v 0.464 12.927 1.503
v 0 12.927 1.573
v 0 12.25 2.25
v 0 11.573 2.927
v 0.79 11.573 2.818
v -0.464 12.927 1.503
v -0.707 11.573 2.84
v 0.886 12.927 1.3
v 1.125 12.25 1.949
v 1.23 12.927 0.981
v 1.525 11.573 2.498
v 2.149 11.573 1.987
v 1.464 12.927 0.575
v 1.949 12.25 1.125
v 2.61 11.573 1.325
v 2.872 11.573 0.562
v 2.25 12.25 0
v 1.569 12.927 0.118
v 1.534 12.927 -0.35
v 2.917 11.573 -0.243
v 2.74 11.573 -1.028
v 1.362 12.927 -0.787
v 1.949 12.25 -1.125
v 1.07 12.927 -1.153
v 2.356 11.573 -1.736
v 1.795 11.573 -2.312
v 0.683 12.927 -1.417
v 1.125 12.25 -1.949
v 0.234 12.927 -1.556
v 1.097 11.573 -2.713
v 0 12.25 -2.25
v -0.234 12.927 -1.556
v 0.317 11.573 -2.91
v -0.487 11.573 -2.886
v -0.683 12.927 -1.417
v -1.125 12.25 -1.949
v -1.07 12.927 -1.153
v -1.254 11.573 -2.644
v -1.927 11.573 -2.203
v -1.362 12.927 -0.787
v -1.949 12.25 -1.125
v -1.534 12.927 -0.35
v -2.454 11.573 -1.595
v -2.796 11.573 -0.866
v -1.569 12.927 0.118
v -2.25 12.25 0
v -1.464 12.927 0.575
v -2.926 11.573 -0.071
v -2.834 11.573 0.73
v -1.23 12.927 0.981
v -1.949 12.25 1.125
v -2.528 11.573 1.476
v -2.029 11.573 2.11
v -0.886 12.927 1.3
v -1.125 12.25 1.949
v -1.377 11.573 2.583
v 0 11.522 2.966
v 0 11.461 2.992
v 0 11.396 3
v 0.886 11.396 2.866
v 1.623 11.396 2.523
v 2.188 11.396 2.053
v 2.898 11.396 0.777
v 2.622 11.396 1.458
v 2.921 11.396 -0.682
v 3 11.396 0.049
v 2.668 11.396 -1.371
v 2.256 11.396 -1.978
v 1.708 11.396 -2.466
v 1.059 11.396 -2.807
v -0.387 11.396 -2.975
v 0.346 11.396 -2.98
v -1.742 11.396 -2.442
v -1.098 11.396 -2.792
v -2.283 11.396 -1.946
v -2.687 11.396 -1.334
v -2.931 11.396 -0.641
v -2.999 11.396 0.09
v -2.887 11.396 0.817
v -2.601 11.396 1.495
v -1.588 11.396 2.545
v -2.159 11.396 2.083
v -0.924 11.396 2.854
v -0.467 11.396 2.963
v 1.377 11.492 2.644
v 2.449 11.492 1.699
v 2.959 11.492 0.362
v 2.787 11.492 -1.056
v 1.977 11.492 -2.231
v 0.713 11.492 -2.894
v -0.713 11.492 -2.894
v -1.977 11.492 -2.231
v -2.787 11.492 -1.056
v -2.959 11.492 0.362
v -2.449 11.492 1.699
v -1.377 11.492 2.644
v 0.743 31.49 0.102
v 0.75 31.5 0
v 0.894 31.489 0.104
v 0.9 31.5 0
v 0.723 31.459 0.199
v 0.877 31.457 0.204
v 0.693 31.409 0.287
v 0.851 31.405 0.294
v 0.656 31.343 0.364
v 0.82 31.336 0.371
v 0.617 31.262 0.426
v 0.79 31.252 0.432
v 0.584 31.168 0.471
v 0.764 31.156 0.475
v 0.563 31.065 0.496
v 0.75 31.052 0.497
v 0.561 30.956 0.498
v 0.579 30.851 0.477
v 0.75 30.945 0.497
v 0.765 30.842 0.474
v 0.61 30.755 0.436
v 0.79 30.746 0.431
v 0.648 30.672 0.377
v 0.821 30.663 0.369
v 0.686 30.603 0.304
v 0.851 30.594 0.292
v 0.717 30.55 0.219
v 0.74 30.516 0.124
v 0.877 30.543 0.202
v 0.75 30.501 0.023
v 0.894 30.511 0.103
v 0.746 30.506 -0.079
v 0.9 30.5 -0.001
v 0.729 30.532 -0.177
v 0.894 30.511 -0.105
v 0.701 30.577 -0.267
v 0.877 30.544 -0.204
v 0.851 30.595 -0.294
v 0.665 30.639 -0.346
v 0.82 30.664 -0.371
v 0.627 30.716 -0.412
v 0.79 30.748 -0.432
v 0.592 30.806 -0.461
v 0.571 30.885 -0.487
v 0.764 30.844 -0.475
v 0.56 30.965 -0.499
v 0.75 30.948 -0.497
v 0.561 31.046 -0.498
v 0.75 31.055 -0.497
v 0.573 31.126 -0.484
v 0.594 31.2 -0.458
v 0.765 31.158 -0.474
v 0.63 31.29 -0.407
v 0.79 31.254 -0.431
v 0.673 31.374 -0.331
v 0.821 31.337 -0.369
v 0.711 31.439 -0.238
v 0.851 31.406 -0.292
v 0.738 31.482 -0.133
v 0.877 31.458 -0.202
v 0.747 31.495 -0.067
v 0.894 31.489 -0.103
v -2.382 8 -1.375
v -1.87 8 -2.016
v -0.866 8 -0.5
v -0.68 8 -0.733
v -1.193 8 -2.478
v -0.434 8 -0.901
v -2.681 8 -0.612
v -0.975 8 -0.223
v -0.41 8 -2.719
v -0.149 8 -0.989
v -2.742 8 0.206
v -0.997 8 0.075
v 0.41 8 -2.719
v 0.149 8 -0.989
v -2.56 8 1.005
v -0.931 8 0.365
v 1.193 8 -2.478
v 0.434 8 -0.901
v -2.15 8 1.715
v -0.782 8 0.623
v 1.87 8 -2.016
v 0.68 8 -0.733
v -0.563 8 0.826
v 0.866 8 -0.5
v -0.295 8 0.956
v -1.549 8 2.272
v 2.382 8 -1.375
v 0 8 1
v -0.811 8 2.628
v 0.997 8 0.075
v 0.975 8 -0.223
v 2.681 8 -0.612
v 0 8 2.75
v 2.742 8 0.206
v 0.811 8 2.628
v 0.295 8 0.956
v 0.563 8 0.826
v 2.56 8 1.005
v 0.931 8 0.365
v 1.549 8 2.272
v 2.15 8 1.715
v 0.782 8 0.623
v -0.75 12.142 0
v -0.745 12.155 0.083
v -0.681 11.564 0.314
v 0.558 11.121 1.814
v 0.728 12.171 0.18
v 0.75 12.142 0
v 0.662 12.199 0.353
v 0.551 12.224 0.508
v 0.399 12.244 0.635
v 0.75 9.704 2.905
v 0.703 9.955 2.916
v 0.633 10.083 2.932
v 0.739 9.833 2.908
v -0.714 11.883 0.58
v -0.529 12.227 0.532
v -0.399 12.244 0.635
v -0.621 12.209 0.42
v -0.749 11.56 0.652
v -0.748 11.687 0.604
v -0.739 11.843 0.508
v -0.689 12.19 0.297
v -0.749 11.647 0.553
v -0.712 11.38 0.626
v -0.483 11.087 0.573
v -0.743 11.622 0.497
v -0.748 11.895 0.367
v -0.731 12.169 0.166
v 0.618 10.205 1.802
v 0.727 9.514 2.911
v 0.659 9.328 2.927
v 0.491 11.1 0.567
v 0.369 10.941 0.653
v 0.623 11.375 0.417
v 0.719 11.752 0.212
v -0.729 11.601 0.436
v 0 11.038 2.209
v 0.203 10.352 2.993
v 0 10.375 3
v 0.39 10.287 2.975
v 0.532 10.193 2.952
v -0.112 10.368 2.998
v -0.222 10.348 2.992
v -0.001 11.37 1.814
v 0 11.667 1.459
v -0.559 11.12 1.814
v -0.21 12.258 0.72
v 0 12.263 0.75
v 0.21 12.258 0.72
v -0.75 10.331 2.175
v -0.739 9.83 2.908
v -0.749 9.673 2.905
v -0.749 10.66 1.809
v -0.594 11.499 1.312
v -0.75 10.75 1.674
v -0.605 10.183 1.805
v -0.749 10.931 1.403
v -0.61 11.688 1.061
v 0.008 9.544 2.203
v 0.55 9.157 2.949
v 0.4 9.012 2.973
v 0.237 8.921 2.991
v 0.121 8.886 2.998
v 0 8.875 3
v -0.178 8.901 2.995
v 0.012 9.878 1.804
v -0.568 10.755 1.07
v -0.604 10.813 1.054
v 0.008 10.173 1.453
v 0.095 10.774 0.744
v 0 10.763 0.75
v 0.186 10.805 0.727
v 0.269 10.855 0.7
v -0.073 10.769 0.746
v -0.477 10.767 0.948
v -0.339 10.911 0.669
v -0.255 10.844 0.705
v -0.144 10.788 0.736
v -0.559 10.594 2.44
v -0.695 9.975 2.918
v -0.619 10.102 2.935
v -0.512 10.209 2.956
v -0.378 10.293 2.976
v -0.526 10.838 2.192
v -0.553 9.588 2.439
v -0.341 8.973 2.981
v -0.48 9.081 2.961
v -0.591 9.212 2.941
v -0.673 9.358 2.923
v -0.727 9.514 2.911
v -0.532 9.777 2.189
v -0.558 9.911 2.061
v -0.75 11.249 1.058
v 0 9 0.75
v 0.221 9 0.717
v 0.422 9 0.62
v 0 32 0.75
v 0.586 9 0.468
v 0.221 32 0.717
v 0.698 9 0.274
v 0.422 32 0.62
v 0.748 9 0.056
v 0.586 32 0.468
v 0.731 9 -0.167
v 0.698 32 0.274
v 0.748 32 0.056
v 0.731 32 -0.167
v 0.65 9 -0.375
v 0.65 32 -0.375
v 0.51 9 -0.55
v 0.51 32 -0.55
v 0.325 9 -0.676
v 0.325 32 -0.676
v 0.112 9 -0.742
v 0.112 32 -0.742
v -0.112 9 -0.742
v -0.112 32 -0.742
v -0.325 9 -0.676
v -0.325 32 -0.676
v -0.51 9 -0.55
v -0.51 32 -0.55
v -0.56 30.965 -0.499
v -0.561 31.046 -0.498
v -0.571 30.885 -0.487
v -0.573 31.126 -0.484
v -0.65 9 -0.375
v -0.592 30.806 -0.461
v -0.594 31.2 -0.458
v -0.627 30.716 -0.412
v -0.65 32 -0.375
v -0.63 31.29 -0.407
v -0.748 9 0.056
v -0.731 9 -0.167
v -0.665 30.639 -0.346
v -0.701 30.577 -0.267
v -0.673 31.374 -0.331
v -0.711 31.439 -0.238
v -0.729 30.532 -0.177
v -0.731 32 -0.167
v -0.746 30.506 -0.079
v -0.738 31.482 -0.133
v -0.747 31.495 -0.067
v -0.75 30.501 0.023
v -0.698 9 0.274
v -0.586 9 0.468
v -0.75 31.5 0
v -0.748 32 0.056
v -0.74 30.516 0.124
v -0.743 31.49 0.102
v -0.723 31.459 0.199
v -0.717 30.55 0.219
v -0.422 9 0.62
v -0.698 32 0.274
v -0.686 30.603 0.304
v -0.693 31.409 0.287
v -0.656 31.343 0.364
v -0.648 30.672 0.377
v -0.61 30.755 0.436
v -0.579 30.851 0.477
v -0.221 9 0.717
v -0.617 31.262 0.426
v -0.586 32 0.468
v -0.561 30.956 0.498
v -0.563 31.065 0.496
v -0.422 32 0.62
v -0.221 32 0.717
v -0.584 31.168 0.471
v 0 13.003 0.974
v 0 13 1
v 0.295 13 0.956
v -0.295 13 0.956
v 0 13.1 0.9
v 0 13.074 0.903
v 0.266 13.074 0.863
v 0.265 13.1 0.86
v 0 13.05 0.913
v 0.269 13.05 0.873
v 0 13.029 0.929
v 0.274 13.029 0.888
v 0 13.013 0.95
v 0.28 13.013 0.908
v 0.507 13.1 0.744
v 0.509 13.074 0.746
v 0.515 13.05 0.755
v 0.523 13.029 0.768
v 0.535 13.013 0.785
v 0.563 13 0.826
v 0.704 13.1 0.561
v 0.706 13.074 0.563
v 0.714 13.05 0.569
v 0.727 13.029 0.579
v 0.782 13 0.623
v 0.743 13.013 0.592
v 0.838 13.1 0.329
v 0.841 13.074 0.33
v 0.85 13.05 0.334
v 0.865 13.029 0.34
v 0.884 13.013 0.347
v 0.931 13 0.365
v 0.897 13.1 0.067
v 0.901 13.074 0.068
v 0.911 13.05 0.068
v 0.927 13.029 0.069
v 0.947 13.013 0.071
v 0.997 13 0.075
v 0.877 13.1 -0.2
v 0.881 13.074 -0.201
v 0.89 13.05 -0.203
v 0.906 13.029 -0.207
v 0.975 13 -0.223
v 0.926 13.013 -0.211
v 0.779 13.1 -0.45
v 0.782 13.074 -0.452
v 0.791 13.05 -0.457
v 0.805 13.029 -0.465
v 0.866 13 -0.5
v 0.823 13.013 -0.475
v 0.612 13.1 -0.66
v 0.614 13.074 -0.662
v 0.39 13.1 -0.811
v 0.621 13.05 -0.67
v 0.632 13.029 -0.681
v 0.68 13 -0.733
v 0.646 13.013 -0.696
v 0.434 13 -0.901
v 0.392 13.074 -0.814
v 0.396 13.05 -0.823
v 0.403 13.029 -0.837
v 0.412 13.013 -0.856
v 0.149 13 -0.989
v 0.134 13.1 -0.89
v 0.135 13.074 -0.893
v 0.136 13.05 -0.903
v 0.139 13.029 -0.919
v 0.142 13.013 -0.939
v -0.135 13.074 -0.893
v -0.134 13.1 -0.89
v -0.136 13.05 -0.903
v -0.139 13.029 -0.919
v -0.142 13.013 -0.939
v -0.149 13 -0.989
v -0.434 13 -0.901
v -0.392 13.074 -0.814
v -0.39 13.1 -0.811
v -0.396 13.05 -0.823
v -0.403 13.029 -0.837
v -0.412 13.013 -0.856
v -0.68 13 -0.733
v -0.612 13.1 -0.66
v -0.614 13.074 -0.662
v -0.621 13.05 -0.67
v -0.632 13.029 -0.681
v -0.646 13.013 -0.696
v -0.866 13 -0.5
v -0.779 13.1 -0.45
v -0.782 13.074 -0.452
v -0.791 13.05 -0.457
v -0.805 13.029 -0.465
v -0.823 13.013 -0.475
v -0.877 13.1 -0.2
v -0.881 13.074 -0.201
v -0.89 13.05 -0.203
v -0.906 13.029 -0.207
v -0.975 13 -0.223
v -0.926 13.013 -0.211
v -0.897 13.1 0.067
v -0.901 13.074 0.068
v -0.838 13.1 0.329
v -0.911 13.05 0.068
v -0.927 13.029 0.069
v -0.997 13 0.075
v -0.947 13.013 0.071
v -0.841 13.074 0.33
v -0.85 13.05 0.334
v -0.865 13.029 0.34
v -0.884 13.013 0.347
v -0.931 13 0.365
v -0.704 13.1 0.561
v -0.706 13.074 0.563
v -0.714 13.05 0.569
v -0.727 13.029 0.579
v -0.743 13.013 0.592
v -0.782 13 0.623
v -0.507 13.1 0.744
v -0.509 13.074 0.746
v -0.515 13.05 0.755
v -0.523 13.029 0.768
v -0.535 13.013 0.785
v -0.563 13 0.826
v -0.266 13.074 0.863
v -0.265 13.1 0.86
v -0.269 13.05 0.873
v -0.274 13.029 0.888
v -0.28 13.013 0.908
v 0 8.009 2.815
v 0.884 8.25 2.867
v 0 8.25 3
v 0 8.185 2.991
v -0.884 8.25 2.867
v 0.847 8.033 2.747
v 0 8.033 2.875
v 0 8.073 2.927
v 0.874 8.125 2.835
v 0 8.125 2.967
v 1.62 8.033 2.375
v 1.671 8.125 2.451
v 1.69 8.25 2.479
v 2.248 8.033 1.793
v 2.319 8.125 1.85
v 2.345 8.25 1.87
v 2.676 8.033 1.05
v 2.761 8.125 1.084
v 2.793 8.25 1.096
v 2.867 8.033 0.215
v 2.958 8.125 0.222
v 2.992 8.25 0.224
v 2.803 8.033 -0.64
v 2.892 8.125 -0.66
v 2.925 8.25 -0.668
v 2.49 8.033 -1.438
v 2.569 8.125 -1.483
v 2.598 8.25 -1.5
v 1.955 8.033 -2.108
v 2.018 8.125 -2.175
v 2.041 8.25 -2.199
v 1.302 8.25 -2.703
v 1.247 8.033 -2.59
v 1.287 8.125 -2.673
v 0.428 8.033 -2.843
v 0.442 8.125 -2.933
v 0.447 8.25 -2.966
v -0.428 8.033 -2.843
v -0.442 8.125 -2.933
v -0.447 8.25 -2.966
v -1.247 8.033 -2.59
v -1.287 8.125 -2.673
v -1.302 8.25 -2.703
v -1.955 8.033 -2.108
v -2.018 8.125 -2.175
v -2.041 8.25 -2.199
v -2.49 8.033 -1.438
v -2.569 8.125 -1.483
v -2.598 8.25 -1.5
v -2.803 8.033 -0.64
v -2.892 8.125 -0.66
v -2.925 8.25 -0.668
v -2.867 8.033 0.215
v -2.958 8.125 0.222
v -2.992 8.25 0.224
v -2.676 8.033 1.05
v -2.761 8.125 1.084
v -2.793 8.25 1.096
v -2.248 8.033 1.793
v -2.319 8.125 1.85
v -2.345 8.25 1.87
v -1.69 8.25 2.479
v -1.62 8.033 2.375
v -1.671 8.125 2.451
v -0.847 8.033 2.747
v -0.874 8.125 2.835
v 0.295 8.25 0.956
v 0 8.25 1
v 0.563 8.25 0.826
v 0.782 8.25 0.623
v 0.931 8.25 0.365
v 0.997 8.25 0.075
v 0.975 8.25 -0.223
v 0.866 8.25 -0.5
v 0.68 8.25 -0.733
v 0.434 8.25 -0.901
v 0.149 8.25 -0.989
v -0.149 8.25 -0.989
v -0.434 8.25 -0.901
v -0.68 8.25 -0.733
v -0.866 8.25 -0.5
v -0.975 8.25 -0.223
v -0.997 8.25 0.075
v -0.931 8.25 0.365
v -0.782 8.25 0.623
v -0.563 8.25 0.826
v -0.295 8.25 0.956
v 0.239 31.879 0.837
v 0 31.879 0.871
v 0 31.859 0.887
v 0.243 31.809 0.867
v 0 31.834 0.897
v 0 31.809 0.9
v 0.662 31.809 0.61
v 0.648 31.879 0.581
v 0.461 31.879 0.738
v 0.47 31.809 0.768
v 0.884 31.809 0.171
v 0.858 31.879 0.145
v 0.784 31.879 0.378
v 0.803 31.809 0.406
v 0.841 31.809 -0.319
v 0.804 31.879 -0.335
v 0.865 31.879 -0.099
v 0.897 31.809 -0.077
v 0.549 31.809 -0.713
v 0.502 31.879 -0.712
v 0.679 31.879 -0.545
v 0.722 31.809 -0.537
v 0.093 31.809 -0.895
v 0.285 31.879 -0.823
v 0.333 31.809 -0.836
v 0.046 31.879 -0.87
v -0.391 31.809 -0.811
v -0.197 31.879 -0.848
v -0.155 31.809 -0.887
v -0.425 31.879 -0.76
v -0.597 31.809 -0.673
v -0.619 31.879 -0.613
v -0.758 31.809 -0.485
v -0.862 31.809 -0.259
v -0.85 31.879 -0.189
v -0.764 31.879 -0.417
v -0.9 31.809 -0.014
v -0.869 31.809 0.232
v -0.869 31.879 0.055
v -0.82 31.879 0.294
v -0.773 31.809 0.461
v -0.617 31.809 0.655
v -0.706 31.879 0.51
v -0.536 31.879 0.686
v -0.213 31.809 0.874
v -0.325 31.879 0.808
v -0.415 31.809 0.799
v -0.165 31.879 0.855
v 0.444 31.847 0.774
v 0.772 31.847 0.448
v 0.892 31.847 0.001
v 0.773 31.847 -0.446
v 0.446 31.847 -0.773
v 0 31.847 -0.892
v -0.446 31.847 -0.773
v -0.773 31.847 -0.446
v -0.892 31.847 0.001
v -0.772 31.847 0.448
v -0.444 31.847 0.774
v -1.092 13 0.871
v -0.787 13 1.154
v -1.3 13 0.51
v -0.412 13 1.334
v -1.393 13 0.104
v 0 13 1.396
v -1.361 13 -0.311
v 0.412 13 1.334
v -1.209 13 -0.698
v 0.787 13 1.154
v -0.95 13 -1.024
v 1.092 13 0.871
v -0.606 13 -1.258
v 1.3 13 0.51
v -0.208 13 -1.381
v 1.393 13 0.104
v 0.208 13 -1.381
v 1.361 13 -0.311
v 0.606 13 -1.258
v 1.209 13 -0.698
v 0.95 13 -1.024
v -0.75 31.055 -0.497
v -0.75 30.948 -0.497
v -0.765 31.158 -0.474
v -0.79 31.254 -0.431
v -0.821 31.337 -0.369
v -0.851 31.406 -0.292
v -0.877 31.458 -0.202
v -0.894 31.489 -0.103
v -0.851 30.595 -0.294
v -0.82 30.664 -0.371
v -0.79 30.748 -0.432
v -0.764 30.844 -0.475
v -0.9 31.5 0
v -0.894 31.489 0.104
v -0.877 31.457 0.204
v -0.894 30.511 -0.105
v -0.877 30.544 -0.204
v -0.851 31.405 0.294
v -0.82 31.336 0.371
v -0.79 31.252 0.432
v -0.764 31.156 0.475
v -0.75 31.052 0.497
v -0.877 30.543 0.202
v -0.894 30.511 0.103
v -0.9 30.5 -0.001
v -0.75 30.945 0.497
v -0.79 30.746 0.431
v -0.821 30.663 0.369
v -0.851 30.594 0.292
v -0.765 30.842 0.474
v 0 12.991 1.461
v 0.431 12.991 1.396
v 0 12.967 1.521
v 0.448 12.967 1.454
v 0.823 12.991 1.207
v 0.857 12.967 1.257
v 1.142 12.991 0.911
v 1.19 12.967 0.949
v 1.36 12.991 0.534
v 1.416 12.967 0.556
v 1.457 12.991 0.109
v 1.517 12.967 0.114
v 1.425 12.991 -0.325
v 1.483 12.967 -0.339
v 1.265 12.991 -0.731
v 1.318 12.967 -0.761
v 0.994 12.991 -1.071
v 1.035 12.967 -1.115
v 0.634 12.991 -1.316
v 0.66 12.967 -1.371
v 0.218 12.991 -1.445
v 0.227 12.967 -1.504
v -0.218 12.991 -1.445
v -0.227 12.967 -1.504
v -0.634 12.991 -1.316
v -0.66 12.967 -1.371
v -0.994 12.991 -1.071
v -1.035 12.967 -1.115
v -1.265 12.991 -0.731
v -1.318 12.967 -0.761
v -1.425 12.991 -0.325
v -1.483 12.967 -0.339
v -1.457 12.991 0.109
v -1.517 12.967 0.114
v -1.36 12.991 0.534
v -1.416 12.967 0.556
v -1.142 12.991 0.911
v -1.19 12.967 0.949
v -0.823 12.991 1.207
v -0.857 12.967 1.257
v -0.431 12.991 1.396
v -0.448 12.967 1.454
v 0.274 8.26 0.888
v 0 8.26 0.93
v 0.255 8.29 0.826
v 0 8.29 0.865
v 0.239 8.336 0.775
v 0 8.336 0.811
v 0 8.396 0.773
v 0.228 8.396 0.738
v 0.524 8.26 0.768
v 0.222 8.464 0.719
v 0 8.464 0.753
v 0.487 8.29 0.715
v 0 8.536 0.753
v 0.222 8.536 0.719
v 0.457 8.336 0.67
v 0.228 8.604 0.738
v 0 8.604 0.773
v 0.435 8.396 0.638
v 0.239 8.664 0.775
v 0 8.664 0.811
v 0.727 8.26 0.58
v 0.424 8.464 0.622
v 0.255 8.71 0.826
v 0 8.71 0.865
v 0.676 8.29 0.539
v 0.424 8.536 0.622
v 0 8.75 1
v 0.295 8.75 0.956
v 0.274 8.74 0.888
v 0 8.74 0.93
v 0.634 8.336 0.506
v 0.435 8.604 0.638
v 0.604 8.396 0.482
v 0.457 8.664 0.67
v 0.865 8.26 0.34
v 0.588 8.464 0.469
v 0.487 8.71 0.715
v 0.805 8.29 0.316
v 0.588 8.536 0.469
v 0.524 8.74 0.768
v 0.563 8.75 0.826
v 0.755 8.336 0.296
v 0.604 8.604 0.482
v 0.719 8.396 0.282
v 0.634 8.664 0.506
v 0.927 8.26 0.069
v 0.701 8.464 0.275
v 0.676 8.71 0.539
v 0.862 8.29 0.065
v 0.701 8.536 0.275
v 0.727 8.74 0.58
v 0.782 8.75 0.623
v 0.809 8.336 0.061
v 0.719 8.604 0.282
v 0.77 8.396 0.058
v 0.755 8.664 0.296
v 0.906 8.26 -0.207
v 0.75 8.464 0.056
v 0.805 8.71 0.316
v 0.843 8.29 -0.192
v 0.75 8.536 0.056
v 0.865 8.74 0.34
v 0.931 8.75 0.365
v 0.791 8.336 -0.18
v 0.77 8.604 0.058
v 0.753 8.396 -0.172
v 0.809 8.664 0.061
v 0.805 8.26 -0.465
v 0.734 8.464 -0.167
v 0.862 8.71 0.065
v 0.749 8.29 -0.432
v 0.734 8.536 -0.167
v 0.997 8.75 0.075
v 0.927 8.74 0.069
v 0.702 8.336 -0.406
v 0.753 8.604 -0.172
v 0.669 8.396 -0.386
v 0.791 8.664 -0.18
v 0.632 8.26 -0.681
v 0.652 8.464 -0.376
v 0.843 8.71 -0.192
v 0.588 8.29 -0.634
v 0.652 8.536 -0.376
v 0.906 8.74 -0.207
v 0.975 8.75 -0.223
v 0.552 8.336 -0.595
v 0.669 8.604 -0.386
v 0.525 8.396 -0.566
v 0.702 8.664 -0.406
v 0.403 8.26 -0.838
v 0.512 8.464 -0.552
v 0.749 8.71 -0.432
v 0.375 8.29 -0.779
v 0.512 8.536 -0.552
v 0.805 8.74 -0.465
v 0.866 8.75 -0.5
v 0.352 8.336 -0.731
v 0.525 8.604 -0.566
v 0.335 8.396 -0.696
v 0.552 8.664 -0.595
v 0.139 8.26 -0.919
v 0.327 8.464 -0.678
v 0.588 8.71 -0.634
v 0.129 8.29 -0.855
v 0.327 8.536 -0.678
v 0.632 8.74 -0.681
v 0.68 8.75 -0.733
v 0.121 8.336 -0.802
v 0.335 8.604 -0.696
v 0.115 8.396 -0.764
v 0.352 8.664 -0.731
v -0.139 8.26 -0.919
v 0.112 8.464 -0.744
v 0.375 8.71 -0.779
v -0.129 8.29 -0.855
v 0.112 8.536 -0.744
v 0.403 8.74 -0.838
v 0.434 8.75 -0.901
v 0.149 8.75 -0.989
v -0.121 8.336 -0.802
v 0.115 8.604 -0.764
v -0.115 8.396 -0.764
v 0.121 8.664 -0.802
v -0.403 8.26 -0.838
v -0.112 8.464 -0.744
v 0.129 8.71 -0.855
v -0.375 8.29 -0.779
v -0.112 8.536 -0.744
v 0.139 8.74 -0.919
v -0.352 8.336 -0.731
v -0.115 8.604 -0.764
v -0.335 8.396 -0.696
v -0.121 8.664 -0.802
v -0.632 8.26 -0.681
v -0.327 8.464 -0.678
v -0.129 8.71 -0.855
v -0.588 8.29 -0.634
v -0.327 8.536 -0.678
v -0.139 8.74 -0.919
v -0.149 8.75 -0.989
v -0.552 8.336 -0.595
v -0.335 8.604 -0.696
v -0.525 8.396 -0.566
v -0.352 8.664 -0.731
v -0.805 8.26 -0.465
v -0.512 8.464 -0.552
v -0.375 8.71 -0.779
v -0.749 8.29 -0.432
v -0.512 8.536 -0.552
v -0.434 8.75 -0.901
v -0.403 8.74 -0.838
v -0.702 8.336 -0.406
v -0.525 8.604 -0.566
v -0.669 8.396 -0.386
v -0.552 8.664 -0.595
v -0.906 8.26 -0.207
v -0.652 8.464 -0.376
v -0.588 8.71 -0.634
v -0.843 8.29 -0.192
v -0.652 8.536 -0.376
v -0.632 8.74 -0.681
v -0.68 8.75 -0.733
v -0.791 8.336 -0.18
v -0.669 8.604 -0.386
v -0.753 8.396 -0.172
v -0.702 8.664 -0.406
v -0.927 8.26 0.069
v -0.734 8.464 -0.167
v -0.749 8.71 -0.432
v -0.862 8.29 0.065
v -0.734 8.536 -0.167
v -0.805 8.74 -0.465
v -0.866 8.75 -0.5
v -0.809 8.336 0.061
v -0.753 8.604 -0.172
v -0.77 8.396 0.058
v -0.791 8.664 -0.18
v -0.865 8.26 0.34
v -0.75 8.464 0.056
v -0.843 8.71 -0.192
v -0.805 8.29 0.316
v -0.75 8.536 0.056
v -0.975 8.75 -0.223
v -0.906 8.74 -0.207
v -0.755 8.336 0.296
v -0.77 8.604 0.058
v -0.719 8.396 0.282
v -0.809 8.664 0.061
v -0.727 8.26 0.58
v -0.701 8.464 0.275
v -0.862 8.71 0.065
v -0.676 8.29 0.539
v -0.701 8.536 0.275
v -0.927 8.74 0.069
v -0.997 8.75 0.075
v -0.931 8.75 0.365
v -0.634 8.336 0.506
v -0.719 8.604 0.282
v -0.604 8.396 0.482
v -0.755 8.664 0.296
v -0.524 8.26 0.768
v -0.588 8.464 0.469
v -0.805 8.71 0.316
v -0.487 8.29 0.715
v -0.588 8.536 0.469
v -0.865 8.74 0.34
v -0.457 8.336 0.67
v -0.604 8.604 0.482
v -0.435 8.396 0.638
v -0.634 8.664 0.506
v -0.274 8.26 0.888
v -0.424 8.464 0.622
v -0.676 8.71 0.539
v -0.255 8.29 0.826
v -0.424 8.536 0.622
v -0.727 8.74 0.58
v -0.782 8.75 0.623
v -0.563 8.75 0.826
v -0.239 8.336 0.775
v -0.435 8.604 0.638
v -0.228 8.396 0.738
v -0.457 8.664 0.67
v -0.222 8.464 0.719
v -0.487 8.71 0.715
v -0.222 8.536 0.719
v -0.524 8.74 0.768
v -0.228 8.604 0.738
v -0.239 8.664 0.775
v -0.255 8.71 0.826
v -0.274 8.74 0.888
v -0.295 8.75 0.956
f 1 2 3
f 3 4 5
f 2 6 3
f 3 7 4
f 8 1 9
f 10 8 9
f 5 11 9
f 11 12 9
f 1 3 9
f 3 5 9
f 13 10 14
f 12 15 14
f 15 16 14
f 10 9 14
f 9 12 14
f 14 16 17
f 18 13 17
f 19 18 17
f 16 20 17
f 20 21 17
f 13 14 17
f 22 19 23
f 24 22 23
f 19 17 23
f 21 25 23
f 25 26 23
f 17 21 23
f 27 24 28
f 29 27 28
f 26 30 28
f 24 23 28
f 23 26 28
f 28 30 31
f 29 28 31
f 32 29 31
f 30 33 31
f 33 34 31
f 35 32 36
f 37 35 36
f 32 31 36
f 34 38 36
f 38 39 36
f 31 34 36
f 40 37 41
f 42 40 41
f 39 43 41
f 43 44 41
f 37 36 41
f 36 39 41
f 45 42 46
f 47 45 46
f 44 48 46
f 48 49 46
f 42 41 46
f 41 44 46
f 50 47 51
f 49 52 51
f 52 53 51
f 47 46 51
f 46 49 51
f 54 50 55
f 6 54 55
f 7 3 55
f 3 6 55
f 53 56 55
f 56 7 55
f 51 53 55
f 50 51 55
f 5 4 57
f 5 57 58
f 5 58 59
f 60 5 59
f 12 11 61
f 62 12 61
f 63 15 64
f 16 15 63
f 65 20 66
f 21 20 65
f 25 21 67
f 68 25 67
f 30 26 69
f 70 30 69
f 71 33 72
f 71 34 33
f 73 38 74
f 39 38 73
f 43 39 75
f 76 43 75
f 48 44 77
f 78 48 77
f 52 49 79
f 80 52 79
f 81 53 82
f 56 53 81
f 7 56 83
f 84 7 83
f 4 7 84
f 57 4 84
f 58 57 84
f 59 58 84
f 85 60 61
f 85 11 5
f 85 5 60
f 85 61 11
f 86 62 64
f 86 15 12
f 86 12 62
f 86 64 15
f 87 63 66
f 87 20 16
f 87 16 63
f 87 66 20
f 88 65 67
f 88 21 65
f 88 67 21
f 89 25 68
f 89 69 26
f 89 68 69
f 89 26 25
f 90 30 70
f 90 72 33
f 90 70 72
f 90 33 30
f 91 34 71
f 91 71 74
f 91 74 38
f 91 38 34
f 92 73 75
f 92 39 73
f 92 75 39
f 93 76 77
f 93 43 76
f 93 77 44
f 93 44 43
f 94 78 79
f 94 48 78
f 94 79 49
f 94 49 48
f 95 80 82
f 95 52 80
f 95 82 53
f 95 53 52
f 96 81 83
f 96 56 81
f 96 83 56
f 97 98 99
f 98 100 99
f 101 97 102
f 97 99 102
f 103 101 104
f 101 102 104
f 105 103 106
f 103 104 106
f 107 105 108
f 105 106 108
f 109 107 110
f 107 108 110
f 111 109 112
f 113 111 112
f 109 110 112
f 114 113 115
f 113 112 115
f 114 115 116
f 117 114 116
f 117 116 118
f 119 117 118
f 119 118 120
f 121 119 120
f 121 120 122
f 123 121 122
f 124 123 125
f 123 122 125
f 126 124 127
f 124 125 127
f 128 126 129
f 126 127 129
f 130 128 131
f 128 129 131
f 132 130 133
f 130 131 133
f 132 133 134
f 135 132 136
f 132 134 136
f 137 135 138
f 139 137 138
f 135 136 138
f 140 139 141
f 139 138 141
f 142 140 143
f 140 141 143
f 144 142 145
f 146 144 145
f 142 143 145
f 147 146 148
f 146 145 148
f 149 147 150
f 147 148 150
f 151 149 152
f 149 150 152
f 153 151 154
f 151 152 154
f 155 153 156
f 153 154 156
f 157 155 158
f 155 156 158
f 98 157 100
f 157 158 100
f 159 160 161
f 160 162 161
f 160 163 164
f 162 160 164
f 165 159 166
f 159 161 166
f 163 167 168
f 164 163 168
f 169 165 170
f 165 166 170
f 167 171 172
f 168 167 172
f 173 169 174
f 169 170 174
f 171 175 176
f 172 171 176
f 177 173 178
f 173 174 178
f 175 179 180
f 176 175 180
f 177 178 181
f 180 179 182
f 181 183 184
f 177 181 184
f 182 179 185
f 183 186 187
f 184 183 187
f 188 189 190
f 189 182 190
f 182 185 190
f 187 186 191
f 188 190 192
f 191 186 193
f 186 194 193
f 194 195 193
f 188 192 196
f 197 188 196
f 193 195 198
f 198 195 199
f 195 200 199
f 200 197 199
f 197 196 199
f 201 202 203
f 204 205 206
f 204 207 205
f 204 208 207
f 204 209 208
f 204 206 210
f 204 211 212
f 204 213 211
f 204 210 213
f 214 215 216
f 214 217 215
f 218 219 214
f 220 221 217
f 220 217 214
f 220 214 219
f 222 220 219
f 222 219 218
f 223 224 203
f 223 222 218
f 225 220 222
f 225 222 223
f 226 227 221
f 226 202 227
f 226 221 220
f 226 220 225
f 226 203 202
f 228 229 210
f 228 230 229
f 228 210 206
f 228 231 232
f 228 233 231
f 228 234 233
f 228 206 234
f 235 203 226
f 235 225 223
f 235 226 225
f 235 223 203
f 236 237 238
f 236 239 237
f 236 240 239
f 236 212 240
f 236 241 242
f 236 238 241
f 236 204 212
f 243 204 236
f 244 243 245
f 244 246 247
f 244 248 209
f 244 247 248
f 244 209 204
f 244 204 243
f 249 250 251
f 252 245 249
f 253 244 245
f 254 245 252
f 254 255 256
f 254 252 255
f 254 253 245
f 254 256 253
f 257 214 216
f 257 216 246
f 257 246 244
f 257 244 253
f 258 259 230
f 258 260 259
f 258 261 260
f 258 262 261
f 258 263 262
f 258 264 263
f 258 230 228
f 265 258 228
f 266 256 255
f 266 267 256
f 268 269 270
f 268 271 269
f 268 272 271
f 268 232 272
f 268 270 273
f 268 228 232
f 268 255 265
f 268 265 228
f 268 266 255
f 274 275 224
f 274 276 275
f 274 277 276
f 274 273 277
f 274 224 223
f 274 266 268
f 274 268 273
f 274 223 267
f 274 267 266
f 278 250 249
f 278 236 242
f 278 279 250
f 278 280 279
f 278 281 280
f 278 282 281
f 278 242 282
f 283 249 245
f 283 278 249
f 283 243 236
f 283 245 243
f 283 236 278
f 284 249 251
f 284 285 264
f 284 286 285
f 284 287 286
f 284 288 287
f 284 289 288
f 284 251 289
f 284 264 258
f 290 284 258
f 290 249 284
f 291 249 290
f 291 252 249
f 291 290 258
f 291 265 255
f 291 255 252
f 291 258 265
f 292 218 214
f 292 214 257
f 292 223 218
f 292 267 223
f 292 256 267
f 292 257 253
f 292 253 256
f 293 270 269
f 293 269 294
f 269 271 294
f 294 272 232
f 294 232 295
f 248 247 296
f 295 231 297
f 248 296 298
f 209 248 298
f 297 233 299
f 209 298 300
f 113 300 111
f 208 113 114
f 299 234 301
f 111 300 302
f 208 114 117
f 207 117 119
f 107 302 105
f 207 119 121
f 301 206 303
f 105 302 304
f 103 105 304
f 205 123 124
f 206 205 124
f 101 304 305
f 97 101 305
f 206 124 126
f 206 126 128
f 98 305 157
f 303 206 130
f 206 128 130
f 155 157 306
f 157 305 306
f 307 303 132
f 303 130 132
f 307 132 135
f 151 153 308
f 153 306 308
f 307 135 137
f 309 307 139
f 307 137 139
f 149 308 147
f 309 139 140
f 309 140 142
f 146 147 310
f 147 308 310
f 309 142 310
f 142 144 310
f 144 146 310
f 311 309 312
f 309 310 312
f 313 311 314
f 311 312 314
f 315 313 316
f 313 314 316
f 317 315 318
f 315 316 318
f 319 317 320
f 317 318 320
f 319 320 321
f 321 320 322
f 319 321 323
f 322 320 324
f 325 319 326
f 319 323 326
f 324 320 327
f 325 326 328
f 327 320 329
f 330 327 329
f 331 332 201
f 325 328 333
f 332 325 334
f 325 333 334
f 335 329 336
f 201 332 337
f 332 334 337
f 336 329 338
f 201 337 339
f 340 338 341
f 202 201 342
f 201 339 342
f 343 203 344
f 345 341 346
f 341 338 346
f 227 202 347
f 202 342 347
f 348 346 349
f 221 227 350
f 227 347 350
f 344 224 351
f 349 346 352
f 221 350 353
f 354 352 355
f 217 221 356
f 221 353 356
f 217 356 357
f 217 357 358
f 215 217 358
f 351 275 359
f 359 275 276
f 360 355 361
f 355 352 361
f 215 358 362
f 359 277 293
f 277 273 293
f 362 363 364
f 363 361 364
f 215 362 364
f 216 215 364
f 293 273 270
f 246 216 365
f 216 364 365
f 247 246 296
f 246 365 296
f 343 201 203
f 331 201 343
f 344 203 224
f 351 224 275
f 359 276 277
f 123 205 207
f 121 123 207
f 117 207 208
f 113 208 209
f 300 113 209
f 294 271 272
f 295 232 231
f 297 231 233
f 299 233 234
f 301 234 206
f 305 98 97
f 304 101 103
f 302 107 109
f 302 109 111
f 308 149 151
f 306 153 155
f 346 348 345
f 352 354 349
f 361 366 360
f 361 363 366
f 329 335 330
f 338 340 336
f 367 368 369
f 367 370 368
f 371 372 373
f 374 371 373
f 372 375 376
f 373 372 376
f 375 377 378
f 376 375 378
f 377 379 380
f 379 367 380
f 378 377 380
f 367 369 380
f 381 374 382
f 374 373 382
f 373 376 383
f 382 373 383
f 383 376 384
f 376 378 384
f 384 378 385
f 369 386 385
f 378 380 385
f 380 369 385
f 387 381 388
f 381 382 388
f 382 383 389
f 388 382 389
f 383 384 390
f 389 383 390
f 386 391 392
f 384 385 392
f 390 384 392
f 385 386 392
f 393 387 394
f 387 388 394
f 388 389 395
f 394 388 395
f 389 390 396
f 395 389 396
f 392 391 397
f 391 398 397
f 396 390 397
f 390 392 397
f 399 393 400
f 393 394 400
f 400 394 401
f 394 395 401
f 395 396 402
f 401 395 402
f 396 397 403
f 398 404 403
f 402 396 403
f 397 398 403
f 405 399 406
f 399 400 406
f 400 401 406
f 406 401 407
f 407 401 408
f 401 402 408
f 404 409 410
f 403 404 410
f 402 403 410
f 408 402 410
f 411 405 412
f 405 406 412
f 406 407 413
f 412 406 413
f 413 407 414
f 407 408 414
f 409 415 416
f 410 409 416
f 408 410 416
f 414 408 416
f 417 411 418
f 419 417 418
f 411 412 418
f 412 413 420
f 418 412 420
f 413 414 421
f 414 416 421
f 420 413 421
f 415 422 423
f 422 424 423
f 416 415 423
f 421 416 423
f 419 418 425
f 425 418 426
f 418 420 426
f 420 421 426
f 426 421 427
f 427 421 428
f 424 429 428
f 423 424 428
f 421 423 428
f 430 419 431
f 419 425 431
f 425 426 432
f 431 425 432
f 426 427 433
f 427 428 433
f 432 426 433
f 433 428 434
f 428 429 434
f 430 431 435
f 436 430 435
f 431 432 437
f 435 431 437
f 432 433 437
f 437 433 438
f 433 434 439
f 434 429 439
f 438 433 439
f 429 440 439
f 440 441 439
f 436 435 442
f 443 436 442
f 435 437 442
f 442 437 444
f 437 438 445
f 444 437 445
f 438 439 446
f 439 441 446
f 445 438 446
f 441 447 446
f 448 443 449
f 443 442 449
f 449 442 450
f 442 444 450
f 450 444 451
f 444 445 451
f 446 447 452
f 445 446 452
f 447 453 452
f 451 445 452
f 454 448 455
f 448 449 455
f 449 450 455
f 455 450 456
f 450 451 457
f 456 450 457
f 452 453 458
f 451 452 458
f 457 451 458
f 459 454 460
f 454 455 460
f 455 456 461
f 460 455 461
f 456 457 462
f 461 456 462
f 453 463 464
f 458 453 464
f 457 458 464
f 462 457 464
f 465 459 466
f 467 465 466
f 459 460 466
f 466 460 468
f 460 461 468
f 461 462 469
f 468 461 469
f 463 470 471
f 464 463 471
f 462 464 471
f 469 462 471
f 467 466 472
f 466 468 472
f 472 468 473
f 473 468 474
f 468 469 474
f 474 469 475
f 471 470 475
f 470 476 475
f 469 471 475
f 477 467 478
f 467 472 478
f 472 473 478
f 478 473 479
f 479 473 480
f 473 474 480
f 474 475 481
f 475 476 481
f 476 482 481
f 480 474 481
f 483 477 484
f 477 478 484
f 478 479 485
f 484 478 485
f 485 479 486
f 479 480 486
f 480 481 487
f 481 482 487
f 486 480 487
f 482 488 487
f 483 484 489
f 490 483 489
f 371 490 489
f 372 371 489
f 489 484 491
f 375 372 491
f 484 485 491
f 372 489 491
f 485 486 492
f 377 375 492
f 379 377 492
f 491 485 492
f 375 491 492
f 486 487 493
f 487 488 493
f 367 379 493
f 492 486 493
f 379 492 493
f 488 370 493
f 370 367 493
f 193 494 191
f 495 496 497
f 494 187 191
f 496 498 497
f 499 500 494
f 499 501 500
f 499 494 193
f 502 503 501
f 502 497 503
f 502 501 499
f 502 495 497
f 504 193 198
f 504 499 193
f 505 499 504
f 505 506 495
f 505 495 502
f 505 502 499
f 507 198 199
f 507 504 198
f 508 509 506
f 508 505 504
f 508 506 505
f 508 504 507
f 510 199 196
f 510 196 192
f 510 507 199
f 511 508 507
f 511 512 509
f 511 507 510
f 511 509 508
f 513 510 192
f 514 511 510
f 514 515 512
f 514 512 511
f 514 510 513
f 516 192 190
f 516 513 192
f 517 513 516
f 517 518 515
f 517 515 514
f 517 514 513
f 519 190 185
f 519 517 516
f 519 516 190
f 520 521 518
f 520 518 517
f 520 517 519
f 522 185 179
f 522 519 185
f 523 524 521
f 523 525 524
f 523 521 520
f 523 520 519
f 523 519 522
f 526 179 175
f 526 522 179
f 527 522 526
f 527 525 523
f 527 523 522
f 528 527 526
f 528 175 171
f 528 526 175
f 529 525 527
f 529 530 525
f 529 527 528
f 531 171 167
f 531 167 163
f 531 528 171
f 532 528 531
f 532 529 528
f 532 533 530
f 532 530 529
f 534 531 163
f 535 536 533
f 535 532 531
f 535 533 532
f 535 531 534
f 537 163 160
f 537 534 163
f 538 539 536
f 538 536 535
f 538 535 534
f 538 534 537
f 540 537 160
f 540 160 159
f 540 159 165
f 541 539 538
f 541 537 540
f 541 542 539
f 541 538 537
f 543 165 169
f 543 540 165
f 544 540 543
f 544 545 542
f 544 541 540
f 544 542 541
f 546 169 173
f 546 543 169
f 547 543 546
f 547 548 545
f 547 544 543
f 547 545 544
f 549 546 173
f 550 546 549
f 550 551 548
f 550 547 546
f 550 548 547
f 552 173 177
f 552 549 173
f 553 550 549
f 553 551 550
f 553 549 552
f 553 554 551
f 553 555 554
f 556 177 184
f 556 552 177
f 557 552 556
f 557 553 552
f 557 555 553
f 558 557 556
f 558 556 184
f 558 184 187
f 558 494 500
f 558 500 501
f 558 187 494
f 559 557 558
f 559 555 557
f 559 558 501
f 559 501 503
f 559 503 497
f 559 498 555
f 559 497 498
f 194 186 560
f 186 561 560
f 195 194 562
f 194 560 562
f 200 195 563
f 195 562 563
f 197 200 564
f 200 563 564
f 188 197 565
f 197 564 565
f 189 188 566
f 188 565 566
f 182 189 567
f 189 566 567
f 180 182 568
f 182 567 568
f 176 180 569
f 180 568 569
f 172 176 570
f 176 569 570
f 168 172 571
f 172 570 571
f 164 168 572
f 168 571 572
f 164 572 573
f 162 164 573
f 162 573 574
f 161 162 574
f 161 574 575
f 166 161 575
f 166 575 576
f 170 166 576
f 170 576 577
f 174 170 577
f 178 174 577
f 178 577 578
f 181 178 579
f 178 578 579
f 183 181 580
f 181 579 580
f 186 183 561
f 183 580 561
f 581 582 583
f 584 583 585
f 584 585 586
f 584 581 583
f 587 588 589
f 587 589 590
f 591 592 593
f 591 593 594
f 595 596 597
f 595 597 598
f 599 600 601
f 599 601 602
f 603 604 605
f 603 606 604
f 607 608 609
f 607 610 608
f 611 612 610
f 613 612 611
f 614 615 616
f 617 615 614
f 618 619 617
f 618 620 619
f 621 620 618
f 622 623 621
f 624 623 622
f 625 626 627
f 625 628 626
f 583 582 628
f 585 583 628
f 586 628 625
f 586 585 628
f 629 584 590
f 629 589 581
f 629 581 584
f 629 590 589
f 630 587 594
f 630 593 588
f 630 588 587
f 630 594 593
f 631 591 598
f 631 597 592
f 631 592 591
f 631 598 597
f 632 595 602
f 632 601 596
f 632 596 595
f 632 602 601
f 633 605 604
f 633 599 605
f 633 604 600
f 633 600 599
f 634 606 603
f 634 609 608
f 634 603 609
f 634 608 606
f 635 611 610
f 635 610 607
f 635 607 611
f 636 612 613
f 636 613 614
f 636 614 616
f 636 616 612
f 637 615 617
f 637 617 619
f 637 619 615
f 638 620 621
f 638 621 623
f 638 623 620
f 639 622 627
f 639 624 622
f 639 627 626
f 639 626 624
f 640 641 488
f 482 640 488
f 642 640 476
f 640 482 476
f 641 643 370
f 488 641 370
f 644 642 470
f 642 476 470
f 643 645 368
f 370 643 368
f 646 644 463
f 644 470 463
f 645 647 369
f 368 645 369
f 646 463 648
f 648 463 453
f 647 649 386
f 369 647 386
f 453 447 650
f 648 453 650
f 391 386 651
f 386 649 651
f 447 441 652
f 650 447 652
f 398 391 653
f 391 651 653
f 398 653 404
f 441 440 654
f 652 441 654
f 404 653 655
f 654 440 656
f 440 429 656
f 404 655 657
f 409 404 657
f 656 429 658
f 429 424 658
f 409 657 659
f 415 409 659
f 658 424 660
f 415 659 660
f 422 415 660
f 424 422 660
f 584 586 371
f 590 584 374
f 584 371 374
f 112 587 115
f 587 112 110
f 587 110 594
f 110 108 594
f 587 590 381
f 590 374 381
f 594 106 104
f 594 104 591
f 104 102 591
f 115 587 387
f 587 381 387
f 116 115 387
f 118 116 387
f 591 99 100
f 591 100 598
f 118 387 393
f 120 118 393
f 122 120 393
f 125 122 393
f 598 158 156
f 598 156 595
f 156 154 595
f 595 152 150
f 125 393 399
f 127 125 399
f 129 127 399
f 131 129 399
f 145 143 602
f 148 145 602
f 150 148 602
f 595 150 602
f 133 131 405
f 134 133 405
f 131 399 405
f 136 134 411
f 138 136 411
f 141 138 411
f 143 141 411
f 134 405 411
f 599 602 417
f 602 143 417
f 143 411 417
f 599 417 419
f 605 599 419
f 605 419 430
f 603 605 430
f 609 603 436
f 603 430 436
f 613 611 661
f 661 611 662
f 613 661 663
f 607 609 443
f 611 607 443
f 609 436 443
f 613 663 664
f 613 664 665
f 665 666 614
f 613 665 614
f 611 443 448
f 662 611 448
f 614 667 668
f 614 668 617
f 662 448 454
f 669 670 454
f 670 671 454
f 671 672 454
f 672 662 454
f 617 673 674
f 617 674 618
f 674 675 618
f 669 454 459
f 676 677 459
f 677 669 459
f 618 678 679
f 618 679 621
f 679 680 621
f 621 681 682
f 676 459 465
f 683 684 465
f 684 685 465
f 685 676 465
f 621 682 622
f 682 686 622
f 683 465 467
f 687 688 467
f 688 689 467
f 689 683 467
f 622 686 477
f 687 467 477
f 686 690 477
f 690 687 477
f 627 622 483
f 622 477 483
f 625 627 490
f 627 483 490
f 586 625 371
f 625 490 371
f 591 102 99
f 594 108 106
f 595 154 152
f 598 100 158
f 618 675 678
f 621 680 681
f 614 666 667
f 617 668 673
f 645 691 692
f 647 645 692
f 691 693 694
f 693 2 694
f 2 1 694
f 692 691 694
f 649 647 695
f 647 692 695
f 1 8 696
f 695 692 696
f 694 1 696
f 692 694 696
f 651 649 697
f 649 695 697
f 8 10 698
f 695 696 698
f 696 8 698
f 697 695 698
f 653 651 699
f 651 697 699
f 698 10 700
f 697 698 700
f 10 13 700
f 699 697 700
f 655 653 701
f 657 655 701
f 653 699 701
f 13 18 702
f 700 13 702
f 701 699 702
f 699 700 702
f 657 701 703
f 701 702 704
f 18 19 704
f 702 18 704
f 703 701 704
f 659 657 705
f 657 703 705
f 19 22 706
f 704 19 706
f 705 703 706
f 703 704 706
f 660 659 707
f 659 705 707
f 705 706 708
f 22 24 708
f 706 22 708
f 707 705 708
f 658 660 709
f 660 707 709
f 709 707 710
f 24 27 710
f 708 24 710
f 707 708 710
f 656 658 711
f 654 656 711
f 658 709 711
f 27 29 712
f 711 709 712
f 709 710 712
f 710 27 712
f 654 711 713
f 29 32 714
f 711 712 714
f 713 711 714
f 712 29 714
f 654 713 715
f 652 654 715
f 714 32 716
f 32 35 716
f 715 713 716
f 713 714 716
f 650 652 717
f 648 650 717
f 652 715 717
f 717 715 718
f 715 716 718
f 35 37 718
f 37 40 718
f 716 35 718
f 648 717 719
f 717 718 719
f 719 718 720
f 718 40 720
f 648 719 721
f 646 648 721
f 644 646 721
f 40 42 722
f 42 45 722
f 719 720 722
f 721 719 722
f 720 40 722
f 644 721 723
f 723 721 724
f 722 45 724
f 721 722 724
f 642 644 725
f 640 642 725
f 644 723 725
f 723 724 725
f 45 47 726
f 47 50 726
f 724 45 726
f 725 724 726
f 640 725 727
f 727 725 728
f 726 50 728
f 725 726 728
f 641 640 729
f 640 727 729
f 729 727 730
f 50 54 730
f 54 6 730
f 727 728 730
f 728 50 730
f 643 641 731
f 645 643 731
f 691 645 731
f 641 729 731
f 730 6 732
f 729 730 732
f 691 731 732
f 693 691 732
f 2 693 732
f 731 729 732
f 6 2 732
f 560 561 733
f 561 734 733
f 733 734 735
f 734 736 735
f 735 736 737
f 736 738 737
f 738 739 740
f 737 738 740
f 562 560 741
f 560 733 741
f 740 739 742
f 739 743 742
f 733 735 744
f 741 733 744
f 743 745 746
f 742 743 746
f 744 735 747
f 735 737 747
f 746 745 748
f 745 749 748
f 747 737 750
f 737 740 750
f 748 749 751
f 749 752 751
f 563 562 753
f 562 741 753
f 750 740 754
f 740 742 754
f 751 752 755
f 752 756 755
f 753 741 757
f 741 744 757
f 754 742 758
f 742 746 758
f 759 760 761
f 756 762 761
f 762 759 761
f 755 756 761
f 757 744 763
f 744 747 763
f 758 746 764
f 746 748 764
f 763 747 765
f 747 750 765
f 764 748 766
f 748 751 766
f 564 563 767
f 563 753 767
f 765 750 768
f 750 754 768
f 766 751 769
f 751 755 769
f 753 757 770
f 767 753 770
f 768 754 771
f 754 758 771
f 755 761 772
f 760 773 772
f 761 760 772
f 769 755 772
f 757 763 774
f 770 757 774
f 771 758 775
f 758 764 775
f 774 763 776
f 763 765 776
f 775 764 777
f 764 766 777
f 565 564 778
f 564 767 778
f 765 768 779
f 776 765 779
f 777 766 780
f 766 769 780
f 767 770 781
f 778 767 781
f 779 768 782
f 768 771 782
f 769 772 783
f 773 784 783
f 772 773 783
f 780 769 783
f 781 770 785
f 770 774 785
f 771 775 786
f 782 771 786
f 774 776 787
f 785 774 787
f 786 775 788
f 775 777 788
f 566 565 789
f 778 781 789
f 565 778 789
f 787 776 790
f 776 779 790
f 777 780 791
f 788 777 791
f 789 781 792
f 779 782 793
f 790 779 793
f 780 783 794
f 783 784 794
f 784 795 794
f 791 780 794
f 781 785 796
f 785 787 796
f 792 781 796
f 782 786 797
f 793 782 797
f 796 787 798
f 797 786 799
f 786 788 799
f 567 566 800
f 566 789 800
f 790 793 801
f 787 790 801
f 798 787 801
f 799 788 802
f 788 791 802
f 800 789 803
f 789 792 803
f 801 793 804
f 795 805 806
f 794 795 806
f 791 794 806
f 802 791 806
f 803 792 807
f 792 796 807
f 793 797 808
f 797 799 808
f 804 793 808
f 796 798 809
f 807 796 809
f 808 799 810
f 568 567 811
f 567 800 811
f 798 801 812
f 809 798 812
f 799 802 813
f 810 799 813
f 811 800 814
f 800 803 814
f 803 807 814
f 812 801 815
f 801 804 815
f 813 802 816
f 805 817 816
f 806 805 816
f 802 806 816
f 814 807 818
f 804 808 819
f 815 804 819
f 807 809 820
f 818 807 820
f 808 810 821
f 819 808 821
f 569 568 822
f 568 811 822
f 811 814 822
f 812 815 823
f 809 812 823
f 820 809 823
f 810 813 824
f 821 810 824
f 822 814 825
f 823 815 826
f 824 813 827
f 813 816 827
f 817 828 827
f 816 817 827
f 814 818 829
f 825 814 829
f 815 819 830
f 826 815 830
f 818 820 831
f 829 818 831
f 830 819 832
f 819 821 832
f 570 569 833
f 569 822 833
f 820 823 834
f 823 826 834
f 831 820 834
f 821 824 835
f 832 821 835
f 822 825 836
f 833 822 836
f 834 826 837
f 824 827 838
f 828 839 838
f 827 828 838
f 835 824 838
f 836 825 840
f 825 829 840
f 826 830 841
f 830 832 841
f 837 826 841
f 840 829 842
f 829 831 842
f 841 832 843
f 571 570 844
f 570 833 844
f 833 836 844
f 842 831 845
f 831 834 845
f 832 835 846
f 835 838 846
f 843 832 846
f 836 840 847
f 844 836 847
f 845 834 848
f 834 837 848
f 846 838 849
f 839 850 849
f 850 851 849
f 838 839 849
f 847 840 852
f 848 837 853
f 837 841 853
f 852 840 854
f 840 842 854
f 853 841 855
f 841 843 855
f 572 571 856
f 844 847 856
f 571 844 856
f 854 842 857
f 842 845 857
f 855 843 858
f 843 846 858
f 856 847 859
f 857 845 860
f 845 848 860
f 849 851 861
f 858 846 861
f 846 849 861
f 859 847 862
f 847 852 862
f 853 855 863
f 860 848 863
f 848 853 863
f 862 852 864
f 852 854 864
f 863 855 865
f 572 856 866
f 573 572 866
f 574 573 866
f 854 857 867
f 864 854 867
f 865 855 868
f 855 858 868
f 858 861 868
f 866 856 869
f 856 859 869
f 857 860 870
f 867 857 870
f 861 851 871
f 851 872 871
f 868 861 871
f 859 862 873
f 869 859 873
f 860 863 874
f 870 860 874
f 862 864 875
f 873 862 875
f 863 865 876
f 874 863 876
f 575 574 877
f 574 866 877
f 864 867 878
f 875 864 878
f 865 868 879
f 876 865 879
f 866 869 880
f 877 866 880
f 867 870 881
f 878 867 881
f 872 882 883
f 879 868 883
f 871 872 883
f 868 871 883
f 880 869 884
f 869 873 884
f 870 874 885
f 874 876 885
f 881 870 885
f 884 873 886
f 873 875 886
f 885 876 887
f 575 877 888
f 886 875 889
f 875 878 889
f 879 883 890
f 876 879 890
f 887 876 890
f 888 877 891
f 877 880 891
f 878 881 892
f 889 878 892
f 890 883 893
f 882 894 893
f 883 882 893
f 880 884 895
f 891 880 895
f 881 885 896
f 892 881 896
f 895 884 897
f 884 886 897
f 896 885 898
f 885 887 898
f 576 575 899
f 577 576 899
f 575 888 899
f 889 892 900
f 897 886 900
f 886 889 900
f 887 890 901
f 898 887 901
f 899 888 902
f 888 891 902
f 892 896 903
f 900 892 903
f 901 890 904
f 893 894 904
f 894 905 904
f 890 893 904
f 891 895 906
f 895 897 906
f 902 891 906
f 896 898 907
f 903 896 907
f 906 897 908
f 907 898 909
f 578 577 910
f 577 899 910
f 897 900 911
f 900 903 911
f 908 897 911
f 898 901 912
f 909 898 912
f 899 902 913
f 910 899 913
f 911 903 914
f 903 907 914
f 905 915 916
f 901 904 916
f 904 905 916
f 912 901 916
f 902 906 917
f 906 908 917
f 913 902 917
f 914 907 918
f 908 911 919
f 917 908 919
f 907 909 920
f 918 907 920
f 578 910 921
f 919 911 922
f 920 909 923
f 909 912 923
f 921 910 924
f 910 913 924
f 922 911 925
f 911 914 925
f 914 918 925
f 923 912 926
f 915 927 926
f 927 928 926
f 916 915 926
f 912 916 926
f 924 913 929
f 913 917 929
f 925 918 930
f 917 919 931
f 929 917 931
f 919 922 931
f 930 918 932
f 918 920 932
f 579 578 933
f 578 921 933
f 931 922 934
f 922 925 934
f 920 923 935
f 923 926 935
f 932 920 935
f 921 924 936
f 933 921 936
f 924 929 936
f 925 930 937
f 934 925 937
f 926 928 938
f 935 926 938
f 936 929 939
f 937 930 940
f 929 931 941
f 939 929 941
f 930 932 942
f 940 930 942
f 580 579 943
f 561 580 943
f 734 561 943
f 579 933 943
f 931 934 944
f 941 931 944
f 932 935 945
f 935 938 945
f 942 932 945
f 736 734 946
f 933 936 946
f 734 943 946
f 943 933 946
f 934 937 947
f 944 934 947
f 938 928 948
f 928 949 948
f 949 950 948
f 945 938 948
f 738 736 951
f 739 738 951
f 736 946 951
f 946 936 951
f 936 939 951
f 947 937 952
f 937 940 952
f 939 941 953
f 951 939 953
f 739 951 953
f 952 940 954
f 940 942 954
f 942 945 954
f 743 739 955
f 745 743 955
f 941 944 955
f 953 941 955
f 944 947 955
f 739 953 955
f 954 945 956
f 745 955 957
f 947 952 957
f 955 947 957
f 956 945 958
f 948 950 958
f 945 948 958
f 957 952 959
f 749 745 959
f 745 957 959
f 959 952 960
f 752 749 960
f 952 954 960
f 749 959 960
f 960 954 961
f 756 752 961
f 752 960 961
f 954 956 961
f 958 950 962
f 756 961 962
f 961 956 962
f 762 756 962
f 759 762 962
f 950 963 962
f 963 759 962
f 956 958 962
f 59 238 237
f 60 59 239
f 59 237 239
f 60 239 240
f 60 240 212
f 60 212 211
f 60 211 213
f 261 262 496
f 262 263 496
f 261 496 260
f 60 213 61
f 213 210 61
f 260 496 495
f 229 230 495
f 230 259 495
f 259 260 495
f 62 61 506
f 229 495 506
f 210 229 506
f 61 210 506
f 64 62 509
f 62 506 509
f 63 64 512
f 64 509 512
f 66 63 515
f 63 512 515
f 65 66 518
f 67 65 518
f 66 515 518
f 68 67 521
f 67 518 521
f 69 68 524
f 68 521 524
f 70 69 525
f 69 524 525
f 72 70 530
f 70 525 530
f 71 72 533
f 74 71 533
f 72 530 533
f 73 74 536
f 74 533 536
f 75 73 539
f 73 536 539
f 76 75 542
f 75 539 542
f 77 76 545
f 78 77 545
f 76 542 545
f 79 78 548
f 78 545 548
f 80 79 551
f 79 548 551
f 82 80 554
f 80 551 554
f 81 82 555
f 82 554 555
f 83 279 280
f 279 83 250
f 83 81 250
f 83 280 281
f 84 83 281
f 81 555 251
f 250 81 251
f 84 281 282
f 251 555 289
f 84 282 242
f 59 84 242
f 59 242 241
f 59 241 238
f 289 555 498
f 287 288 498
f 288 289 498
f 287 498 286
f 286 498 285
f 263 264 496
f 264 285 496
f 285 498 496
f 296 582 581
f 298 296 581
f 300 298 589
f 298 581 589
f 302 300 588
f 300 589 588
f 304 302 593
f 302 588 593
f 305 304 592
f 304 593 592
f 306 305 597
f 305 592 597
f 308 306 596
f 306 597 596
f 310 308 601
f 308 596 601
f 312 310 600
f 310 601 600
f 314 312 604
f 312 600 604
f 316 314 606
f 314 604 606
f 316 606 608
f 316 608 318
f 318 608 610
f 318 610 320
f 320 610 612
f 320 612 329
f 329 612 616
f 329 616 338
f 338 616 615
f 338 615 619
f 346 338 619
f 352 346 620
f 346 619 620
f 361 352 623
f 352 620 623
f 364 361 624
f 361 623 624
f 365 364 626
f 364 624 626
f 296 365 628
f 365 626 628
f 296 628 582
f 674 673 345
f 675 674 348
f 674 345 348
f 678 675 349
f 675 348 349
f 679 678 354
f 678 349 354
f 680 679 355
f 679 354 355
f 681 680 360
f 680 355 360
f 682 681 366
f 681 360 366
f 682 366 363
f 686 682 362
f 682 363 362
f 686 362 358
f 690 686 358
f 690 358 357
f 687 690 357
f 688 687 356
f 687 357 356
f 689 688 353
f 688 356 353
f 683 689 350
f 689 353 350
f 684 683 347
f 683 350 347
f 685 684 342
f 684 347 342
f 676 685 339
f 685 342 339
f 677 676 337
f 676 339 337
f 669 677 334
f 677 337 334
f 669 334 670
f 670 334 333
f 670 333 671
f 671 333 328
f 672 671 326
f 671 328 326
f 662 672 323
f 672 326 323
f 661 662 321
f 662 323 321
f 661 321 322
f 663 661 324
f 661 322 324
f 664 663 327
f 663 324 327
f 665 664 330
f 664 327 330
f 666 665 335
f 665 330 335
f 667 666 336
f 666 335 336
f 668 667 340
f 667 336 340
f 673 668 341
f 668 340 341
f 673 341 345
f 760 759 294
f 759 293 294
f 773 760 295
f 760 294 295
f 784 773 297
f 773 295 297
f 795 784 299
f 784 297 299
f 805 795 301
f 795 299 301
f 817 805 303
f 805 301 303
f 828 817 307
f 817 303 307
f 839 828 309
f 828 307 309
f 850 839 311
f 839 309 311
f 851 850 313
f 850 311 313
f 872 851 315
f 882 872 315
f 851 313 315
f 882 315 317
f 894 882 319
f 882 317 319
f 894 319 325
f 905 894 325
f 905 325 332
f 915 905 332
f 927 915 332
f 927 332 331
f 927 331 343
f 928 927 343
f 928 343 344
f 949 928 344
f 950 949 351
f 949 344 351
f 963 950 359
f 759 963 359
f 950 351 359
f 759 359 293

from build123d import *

# Parameters (mm, degrees)
F3_R     = 0.1
F4_R     = 0.25
F6_R     = 0.75
F8_R     = 0.5
F9_DEPTH = 2.5


with BuildPart() as f2:
    # F0 (on Right) → F2 (revolve)
    with BuildSketch(Plane.YZ):
        with BuildLine():
            Line((11.5, 3), (8, 3))
            Line((8, 3), (8, 1))
            Line((8, 1), (8.25, 1))
            ThreePointArc((8.25, 1), (8.5, 0.75), (8.75, 1))
            Line((8.75, 1), (9, 0.75))
            Line((9, 0.75), (32, 0.75))
            Line((32, 0.75), (31.85, 0.9))
            Line((31.85, 0.9), (13, 0.9))
            Line((13, 0.9), (13, 1.5))
            Line((13, 1.5), (11.5, 3))
        make_face()
    revolve(axis=Axis((0, 17.771827057, 0), (0, 1, 0)))

    # F3
    f3_edges = [f2.edges().sort_by_distance(p)[0] for p in [
        (0, 31.85, -0.9),
        (0, 13, -0.9),
    ]]
    fillet(f3_edges, radius=F3_R)

    # F4
    f4_edges = [f2.edges().sort_by_distance(p)[0] for p in [
        (0, 13, -1.5),
        (0, 11.5, -3),
        (0, 8, -3),
    ]]
    fillet(f4_edges, radius=F4_R)

    # F7: sweep along a path in F5
    with BuildLine(Plane.YZ) as f7_path:
        Line((3.6301804626, 10), (11.391852051, 0.75))
    # F6 (on Top) → F7 (sweep, cut)
    with BuildSketch(Plane.XY):
        with Locations((0, 12.141852051)):
            Circle(F6_R)
    sweep(path=f7_path.line, mode=Mode.SUBTRACT)

    # F8 (on Right) → F9 (cut, symmetric)
    with BuildSketch(Plane.YZ):
        with Locations((31, 0)):
            Circle(F8_R)
    extrude(amount=F9_DEPTH, both=True, mode=Mode.SUBTRACT)


solid = f2.part
